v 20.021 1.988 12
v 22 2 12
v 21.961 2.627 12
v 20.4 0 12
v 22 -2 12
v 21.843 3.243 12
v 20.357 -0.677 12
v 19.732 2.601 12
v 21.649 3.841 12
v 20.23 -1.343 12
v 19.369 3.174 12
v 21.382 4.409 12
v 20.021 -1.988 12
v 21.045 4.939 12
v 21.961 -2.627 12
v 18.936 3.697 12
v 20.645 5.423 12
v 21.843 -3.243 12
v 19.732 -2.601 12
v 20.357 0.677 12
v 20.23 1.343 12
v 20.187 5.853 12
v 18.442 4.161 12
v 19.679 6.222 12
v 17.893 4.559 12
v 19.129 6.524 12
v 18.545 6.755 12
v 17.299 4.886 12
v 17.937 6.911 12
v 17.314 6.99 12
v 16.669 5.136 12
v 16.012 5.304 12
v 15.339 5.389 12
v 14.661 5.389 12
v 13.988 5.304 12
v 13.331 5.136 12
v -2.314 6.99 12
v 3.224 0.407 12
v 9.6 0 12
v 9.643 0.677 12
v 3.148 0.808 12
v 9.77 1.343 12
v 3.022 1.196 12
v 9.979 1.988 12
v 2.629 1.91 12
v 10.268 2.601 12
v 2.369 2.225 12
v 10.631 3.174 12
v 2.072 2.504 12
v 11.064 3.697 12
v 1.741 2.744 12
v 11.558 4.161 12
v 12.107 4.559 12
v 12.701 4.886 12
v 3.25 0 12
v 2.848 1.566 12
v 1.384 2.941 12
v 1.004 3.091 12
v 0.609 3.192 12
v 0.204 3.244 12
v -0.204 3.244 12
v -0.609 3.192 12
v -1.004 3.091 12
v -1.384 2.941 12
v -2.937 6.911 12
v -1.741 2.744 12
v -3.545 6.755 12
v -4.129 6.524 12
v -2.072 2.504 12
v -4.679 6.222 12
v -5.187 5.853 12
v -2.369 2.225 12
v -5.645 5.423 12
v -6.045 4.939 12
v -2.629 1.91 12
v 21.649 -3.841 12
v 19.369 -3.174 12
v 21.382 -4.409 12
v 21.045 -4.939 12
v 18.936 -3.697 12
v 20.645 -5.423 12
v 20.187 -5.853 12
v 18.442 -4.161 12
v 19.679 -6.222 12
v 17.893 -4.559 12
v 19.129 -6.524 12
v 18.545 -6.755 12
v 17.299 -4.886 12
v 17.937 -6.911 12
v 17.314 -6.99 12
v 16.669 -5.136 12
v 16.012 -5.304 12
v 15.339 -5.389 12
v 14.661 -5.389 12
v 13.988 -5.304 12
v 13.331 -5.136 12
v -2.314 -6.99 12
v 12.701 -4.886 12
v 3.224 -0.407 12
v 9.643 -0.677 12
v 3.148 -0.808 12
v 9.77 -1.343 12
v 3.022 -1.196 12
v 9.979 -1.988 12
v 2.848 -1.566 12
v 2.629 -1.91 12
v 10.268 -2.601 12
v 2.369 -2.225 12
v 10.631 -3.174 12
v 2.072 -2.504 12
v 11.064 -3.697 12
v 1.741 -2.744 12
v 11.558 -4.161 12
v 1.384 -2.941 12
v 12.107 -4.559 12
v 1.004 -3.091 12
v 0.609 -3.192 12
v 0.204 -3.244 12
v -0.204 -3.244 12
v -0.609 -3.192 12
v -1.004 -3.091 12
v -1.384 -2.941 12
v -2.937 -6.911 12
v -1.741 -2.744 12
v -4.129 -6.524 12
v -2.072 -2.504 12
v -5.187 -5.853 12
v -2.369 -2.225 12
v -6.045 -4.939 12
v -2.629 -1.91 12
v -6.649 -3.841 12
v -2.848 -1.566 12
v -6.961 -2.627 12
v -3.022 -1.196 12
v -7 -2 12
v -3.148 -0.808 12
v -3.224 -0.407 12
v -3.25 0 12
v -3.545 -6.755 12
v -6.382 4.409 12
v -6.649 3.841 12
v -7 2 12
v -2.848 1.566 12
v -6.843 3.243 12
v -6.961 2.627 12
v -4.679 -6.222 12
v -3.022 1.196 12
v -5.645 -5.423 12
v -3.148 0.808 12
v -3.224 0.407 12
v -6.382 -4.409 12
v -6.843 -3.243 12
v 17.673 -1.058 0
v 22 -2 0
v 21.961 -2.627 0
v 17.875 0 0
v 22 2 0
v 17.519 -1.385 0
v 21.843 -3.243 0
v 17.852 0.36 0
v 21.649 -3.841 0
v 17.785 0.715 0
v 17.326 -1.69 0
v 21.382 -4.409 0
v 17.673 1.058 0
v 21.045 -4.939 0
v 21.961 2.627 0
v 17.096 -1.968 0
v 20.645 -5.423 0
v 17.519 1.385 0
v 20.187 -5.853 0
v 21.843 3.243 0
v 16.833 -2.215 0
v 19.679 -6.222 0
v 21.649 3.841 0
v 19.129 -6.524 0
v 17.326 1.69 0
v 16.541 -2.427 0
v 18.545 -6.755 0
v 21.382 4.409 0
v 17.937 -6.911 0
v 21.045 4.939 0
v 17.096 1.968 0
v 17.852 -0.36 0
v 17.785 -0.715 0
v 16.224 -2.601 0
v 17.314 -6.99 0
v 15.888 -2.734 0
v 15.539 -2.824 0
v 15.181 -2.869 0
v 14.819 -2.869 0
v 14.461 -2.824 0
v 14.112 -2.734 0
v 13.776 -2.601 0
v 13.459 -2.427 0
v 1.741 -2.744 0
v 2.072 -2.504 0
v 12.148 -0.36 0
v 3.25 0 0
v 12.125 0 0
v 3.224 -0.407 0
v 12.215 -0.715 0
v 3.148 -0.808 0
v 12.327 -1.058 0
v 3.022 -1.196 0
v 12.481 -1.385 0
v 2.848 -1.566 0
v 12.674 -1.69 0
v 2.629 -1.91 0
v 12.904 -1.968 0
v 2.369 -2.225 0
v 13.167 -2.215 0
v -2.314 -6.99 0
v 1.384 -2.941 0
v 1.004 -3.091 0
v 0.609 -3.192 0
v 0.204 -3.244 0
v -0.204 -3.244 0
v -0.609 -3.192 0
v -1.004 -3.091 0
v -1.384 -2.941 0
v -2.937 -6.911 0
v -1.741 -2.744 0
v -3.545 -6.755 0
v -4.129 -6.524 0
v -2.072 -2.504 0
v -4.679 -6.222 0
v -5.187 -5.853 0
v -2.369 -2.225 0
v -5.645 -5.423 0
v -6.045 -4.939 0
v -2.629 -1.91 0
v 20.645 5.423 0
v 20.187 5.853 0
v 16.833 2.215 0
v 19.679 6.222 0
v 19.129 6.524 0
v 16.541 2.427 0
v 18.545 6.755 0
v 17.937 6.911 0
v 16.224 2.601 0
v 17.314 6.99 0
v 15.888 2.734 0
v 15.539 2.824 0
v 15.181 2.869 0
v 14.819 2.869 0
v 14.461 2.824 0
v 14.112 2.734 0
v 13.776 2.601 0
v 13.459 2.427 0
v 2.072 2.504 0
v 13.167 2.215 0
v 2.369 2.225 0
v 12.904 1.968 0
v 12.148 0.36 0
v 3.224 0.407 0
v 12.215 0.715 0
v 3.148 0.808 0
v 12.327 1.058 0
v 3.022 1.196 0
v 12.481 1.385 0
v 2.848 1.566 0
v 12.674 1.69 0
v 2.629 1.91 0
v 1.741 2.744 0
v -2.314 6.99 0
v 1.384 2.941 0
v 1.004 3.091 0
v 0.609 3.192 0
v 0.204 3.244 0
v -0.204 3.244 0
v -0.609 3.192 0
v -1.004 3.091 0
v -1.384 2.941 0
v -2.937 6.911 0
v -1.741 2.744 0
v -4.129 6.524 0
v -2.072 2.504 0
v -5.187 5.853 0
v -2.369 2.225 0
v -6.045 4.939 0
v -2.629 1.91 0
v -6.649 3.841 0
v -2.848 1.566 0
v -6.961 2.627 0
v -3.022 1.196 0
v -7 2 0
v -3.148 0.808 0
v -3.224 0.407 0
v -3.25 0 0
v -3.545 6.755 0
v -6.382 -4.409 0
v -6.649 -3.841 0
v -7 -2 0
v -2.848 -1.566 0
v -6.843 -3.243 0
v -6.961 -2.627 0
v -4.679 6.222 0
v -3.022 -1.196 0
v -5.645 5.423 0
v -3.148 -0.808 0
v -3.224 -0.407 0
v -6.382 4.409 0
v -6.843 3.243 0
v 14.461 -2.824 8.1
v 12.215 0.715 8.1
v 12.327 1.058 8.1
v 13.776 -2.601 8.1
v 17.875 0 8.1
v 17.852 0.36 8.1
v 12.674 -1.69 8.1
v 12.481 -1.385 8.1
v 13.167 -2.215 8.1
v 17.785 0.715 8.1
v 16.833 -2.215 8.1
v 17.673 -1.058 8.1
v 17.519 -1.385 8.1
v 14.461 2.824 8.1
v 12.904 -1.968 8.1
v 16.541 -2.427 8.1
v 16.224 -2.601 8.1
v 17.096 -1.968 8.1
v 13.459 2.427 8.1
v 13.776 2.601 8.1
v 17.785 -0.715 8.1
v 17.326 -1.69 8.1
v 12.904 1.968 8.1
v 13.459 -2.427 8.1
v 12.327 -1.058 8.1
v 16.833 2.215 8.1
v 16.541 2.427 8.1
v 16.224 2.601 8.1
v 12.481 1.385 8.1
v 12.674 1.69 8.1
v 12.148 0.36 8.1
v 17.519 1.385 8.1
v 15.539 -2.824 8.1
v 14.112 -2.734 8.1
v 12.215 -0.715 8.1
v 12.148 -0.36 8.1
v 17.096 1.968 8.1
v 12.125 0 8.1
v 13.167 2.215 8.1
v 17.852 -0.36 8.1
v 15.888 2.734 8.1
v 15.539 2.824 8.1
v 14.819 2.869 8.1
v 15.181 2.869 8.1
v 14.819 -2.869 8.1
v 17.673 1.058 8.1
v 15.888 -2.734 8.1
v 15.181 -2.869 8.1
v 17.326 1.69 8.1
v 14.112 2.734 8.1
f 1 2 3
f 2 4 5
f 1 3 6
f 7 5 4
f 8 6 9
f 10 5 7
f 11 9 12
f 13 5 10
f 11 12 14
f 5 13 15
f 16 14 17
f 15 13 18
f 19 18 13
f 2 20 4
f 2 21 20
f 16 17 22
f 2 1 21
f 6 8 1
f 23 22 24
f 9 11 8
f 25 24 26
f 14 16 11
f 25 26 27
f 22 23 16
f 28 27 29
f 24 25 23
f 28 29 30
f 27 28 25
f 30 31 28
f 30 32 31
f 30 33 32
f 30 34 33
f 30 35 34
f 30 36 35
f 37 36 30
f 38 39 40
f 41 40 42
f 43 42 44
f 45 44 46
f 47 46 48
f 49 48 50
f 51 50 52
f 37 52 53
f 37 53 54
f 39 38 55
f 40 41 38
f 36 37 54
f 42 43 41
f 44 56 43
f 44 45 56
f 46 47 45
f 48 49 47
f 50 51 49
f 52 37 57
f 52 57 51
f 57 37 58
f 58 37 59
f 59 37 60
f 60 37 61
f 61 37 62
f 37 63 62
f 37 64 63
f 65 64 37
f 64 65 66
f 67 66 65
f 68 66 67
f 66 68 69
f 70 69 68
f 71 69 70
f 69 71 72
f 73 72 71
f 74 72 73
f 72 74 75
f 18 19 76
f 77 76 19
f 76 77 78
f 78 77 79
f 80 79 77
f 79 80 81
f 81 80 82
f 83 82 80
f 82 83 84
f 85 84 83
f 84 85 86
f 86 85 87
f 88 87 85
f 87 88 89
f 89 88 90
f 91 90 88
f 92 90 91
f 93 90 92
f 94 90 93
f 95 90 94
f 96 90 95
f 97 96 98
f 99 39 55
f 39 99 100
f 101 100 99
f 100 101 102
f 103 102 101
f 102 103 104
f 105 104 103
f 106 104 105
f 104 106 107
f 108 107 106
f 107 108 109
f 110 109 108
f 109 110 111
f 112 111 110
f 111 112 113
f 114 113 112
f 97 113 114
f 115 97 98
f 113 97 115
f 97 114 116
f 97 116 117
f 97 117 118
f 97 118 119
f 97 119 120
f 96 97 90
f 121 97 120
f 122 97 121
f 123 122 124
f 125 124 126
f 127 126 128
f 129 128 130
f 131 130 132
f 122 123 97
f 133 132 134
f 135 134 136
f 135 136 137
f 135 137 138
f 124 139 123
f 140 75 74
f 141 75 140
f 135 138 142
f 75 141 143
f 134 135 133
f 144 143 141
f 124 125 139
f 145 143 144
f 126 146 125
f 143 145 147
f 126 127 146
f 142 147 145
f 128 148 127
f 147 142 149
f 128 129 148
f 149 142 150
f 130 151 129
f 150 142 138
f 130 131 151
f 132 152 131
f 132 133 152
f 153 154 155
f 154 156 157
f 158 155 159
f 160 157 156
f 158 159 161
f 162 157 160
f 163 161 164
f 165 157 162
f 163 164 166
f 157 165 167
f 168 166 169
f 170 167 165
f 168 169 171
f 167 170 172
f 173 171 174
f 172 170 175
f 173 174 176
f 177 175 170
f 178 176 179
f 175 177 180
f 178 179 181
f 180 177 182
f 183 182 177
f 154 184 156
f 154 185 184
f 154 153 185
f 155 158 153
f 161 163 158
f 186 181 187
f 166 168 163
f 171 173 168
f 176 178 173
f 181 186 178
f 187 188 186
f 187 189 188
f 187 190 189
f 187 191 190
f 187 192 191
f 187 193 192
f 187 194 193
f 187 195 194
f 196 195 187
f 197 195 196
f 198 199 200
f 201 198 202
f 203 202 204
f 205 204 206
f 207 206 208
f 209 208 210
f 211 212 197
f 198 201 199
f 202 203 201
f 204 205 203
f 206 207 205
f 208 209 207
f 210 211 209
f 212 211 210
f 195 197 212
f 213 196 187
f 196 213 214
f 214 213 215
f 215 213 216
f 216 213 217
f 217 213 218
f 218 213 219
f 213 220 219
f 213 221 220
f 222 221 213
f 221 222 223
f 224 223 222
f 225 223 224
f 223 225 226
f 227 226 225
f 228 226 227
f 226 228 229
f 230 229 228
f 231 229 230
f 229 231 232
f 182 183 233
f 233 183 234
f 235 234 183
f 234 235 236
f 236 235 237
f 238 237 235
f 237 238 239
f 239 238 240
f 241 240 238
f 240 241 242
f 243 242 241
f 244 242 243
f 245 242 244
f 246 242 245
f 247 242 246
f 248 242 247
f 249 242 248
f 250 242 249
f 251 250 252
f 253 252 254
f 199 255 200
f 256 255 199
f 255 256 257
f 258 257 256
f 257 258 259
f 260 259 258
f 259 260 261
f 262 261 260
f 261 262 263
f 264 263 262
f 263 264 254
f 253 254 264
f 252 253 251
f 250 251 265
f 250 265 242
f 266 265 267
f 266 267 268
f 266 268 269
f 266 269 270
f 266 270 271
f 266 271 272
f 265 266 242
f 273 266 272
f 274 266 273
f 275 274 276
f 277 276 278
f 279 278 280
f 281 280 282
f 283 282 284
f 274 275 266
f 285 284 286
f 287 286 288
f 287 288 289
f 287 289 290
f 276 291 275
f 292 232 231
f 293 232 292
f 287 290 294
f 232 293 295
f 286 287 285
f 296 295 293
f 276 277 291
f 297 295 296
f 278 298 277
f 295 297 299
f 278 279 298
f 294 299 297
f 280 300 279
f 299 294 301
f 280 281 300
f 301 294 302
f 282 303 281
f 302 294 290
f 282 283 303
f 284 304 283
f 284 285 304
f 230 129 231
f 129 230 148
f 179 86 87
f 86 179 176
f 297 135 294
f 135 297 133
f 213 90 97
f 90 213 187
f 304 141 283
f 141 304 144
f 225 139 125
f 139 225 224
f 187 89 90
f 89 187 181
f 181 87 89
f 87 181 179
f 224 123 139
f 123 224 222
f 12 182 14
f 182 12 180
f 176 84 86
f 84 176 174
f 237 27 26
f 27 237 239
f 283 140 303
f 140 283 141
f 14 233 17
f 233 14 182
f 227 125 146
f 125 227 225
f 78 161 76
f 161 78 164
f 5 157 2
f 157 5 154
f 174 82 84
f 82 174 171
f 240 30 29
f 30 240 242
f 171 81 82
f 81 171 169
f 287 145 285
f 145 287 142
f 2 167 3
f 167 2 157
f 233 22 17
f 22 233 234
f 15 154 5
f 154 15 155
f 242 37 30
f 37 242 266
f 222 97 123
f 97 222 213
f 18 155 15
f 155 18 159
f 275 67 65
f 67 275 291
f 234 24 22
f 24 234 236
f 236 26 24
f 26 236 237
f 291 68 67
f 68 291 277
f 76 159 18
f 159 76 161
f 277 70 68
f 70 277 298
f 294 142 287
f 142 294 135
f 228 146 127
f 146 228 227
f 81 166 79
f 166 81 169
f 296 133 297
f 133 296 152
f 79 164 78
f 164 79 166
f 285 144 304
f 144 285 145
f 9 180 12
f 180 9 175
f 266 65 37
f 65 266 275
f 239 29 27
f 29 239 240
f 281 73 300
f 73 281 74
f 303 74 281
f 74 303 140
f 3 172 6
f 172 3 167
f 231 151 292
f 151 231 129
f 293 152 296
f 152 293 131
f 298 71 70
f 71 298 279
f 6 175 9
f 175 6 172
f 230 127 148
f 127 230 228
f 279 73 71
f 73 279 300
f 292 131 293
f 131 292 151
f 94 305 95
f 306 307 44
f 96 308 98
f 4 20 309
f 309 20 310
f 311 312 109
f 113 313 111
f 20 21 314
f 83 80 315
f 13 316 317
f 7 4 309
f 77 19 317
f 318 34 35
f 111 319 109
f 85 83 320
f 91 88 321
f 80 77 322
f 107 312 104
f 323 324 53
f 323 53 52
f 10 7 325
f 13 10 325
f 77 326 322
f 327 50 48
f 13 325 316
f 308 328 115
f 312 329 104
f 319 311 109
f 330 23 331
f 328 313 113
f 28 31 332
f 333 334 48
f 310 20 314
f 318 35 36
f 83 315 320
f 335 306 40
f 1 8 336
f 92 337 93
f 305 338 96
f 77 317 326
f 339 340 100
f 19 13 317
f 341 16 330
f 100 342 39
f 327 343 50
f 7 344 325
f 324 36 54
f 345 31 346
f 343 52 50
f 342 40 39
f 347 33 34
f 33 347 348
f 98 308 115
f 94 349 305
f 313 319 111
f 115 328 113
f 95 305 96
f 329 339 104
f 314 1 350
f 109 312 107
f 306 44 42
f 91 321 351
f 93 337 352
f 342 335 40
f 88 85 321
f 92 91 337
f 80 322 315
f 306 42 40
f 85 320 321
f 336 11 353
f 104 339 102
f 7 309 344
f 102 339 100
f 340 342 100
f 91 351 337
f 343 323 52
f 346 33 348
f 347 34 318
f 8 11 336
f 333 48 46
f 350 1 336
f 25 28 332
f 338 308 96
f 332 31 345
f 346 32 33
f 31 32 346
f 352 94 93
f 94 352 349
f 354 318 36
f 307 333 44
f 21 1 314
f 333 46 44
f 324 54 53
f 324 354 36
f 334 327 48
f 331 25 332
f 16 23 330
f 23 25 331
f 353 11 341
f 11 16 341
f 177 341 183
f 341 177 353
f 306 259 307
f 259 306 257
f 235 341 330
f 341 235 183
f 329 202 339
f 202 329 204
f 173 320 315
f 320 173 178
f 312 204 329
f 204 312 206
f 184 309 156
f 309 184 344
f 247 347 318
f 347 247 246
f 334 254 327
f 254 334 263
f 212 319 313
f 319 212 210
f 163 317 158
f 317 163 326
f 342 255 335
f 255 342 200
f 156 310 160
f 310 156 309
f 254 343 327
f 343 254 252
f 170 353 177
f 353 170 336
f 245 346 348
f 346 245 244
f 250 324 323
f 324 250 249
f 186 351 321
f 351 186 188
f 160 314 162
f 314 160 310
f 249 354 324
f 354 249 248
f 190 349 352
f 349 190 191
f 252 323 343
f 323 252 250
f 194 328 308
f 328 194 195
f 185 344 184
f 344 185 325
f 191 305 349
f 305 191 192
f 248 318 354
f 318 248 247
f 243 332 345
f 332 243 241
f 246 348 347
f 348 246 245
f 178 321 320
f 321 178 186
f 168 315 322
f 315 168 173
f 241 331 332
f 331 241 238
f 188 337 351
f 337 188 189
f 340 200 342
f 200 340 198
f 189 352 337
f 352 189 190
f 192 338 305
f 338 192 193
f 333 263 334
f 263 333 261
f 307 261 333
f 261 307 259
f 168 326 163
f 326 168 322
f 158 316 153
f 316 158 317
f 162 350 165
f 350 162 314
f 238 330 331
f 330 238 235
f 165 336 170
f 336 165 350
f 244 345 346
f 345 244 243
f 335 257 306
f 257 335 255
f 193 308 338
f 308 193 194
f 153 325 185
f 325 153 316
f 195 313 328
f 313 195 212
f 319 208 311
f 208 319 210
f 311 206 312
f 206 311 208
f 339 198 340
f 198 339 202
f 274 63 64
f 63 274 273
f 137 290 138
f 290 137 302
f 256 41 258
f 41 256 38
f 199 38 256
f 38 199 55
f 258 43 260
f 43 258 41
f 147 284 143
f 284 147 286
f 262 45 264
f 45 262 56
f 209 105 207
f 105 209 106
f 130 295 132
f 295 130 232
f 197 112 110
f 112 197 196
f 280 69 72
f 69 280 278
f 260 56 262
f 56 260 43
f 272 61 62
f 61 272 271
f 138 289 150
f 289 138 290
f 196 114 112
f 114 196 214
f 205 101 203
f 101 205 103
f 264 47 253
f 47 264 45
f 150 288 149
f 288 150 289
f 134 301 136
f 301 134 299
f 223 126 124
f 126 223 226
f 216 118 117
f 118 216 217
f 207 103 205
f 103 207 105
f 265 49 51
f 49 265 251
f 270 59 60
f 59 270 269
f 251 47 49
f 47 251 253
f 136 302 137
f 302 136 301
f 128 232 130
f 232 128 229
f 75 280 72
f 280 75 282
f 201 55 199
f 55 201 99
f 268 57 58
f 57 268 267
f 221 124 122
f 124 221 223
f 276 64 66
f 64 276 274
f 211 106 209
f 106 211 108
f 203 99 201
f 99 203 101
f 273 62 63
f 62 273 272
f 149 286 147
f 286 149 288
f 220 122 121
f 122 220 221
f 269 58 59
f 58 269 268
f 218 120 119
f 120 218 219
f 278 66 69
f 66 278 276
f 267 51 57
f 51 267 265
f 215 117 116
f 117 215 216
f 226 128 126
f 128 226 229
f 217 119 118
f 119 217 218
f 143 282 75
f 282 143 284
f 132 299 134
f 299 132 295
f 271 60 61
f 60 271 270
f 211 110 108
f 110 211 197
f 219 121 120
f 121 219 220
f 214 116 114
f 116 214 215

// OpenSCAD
$fn = 50;


difference() {
	union() {
		cylinder(h = 12, r = 7.0000000000);
		translate(v = [7.5000000000, 0.0000000000, 0]) {
			hull() {
				translate(v = [-9.5000000000, 2.0000000000, 0]) {
					cylinder(h = 12, r = 5);
				}
				translate(v = [9.5000000000, 2.0000000000, 0]) {
					cylinder(h = 12, r = 5);
				}
				translate(v = [-9.5000000000, -2.0000000000, 0]) {
					cylinder(h = 12, r = 5);
				}
				translate(v = [9.5000000000, -2.0000000000, 0]) {
					cylinder(h = 12, r = 5);
				}
			}
		}
		translate(v = [7.5000000000, 0.0000000000, 0]) {
			hull() {
				translate(v = [-9.5000000000, 2.0000000000, 0]) {
					cylinder(h = 12, r = 5);
				}
				translate(v = [9.5000000000, 2.0000000000, 0]) {
					cylinder(h = 12, r = 5);
				}
				translate(v = [-9.5000000000, -2.0000000000, 0]) {
					cylinder(h = 12, r = 5);
				}
				translate(v = [9.5000000000, -2.0000000000, 0]) {
					cylinder(h = 12, r = 5);
				}
			}
		}
	}
	union() {
		translate(v = [15.0000000000, 0.0000000000, 12]) {
			rotate(a = [0, 0, 0]) {
				difference() {
					union() {
						#translate(v = [0, 0, -12.0000000000]) {
							cylinder(h = 12, r = 2.6000000000);
						}
						#translate(v = [0, 0, -3.9000000000]) {
							cylinder(h = 3.9000000000, r1 = 2.8750000000, r2 = 5.4000000000);
						}
						#translate(v = [0, 0, -12.0000000000]) {
							cylinder(h = 12, r = 2.8750000000);
						}
						#translate(v = [0, 0, -12.0000000000]) {
							cylinder(h = 12, r = 2.6000000000);
						}
					}
					union();
				}
			}
		}
		translate(v = [15.0000000000, 0.0000000000, 12]) {
			rotate(a = [0, 0, 0]) {
				difference() {
					union() {
						#translate(v = [0, 0, -12.0000000000]) {
							cylinder(h = 12, r = 2.6000000000);
						}
						#translate(v = [0, 0, -3.9000000000]) {
							cylinder(h = 3.9000000000, r1 = 2.8750000000, r2 = 5.4000000000);
						}
						#translate(v = [0, 0, -12.0000000000]) {
							cylinder(h = 12, r = 2.8750000000);
						}
						#translate(v = [0, 0, -12.0000000000]) {
							cylinder(h = 12, r = 2.6000000000);
						}
					}
					union();
				}
			}
		}
		translate(v = [0, 0, -100]) {
			cylinder(h = 200, r = 3.2500000000);
		}
		translate(v = [0, 0, -100]) {
			cylinder(h = 200, r = 1.8000000000);
		}
	}
}
